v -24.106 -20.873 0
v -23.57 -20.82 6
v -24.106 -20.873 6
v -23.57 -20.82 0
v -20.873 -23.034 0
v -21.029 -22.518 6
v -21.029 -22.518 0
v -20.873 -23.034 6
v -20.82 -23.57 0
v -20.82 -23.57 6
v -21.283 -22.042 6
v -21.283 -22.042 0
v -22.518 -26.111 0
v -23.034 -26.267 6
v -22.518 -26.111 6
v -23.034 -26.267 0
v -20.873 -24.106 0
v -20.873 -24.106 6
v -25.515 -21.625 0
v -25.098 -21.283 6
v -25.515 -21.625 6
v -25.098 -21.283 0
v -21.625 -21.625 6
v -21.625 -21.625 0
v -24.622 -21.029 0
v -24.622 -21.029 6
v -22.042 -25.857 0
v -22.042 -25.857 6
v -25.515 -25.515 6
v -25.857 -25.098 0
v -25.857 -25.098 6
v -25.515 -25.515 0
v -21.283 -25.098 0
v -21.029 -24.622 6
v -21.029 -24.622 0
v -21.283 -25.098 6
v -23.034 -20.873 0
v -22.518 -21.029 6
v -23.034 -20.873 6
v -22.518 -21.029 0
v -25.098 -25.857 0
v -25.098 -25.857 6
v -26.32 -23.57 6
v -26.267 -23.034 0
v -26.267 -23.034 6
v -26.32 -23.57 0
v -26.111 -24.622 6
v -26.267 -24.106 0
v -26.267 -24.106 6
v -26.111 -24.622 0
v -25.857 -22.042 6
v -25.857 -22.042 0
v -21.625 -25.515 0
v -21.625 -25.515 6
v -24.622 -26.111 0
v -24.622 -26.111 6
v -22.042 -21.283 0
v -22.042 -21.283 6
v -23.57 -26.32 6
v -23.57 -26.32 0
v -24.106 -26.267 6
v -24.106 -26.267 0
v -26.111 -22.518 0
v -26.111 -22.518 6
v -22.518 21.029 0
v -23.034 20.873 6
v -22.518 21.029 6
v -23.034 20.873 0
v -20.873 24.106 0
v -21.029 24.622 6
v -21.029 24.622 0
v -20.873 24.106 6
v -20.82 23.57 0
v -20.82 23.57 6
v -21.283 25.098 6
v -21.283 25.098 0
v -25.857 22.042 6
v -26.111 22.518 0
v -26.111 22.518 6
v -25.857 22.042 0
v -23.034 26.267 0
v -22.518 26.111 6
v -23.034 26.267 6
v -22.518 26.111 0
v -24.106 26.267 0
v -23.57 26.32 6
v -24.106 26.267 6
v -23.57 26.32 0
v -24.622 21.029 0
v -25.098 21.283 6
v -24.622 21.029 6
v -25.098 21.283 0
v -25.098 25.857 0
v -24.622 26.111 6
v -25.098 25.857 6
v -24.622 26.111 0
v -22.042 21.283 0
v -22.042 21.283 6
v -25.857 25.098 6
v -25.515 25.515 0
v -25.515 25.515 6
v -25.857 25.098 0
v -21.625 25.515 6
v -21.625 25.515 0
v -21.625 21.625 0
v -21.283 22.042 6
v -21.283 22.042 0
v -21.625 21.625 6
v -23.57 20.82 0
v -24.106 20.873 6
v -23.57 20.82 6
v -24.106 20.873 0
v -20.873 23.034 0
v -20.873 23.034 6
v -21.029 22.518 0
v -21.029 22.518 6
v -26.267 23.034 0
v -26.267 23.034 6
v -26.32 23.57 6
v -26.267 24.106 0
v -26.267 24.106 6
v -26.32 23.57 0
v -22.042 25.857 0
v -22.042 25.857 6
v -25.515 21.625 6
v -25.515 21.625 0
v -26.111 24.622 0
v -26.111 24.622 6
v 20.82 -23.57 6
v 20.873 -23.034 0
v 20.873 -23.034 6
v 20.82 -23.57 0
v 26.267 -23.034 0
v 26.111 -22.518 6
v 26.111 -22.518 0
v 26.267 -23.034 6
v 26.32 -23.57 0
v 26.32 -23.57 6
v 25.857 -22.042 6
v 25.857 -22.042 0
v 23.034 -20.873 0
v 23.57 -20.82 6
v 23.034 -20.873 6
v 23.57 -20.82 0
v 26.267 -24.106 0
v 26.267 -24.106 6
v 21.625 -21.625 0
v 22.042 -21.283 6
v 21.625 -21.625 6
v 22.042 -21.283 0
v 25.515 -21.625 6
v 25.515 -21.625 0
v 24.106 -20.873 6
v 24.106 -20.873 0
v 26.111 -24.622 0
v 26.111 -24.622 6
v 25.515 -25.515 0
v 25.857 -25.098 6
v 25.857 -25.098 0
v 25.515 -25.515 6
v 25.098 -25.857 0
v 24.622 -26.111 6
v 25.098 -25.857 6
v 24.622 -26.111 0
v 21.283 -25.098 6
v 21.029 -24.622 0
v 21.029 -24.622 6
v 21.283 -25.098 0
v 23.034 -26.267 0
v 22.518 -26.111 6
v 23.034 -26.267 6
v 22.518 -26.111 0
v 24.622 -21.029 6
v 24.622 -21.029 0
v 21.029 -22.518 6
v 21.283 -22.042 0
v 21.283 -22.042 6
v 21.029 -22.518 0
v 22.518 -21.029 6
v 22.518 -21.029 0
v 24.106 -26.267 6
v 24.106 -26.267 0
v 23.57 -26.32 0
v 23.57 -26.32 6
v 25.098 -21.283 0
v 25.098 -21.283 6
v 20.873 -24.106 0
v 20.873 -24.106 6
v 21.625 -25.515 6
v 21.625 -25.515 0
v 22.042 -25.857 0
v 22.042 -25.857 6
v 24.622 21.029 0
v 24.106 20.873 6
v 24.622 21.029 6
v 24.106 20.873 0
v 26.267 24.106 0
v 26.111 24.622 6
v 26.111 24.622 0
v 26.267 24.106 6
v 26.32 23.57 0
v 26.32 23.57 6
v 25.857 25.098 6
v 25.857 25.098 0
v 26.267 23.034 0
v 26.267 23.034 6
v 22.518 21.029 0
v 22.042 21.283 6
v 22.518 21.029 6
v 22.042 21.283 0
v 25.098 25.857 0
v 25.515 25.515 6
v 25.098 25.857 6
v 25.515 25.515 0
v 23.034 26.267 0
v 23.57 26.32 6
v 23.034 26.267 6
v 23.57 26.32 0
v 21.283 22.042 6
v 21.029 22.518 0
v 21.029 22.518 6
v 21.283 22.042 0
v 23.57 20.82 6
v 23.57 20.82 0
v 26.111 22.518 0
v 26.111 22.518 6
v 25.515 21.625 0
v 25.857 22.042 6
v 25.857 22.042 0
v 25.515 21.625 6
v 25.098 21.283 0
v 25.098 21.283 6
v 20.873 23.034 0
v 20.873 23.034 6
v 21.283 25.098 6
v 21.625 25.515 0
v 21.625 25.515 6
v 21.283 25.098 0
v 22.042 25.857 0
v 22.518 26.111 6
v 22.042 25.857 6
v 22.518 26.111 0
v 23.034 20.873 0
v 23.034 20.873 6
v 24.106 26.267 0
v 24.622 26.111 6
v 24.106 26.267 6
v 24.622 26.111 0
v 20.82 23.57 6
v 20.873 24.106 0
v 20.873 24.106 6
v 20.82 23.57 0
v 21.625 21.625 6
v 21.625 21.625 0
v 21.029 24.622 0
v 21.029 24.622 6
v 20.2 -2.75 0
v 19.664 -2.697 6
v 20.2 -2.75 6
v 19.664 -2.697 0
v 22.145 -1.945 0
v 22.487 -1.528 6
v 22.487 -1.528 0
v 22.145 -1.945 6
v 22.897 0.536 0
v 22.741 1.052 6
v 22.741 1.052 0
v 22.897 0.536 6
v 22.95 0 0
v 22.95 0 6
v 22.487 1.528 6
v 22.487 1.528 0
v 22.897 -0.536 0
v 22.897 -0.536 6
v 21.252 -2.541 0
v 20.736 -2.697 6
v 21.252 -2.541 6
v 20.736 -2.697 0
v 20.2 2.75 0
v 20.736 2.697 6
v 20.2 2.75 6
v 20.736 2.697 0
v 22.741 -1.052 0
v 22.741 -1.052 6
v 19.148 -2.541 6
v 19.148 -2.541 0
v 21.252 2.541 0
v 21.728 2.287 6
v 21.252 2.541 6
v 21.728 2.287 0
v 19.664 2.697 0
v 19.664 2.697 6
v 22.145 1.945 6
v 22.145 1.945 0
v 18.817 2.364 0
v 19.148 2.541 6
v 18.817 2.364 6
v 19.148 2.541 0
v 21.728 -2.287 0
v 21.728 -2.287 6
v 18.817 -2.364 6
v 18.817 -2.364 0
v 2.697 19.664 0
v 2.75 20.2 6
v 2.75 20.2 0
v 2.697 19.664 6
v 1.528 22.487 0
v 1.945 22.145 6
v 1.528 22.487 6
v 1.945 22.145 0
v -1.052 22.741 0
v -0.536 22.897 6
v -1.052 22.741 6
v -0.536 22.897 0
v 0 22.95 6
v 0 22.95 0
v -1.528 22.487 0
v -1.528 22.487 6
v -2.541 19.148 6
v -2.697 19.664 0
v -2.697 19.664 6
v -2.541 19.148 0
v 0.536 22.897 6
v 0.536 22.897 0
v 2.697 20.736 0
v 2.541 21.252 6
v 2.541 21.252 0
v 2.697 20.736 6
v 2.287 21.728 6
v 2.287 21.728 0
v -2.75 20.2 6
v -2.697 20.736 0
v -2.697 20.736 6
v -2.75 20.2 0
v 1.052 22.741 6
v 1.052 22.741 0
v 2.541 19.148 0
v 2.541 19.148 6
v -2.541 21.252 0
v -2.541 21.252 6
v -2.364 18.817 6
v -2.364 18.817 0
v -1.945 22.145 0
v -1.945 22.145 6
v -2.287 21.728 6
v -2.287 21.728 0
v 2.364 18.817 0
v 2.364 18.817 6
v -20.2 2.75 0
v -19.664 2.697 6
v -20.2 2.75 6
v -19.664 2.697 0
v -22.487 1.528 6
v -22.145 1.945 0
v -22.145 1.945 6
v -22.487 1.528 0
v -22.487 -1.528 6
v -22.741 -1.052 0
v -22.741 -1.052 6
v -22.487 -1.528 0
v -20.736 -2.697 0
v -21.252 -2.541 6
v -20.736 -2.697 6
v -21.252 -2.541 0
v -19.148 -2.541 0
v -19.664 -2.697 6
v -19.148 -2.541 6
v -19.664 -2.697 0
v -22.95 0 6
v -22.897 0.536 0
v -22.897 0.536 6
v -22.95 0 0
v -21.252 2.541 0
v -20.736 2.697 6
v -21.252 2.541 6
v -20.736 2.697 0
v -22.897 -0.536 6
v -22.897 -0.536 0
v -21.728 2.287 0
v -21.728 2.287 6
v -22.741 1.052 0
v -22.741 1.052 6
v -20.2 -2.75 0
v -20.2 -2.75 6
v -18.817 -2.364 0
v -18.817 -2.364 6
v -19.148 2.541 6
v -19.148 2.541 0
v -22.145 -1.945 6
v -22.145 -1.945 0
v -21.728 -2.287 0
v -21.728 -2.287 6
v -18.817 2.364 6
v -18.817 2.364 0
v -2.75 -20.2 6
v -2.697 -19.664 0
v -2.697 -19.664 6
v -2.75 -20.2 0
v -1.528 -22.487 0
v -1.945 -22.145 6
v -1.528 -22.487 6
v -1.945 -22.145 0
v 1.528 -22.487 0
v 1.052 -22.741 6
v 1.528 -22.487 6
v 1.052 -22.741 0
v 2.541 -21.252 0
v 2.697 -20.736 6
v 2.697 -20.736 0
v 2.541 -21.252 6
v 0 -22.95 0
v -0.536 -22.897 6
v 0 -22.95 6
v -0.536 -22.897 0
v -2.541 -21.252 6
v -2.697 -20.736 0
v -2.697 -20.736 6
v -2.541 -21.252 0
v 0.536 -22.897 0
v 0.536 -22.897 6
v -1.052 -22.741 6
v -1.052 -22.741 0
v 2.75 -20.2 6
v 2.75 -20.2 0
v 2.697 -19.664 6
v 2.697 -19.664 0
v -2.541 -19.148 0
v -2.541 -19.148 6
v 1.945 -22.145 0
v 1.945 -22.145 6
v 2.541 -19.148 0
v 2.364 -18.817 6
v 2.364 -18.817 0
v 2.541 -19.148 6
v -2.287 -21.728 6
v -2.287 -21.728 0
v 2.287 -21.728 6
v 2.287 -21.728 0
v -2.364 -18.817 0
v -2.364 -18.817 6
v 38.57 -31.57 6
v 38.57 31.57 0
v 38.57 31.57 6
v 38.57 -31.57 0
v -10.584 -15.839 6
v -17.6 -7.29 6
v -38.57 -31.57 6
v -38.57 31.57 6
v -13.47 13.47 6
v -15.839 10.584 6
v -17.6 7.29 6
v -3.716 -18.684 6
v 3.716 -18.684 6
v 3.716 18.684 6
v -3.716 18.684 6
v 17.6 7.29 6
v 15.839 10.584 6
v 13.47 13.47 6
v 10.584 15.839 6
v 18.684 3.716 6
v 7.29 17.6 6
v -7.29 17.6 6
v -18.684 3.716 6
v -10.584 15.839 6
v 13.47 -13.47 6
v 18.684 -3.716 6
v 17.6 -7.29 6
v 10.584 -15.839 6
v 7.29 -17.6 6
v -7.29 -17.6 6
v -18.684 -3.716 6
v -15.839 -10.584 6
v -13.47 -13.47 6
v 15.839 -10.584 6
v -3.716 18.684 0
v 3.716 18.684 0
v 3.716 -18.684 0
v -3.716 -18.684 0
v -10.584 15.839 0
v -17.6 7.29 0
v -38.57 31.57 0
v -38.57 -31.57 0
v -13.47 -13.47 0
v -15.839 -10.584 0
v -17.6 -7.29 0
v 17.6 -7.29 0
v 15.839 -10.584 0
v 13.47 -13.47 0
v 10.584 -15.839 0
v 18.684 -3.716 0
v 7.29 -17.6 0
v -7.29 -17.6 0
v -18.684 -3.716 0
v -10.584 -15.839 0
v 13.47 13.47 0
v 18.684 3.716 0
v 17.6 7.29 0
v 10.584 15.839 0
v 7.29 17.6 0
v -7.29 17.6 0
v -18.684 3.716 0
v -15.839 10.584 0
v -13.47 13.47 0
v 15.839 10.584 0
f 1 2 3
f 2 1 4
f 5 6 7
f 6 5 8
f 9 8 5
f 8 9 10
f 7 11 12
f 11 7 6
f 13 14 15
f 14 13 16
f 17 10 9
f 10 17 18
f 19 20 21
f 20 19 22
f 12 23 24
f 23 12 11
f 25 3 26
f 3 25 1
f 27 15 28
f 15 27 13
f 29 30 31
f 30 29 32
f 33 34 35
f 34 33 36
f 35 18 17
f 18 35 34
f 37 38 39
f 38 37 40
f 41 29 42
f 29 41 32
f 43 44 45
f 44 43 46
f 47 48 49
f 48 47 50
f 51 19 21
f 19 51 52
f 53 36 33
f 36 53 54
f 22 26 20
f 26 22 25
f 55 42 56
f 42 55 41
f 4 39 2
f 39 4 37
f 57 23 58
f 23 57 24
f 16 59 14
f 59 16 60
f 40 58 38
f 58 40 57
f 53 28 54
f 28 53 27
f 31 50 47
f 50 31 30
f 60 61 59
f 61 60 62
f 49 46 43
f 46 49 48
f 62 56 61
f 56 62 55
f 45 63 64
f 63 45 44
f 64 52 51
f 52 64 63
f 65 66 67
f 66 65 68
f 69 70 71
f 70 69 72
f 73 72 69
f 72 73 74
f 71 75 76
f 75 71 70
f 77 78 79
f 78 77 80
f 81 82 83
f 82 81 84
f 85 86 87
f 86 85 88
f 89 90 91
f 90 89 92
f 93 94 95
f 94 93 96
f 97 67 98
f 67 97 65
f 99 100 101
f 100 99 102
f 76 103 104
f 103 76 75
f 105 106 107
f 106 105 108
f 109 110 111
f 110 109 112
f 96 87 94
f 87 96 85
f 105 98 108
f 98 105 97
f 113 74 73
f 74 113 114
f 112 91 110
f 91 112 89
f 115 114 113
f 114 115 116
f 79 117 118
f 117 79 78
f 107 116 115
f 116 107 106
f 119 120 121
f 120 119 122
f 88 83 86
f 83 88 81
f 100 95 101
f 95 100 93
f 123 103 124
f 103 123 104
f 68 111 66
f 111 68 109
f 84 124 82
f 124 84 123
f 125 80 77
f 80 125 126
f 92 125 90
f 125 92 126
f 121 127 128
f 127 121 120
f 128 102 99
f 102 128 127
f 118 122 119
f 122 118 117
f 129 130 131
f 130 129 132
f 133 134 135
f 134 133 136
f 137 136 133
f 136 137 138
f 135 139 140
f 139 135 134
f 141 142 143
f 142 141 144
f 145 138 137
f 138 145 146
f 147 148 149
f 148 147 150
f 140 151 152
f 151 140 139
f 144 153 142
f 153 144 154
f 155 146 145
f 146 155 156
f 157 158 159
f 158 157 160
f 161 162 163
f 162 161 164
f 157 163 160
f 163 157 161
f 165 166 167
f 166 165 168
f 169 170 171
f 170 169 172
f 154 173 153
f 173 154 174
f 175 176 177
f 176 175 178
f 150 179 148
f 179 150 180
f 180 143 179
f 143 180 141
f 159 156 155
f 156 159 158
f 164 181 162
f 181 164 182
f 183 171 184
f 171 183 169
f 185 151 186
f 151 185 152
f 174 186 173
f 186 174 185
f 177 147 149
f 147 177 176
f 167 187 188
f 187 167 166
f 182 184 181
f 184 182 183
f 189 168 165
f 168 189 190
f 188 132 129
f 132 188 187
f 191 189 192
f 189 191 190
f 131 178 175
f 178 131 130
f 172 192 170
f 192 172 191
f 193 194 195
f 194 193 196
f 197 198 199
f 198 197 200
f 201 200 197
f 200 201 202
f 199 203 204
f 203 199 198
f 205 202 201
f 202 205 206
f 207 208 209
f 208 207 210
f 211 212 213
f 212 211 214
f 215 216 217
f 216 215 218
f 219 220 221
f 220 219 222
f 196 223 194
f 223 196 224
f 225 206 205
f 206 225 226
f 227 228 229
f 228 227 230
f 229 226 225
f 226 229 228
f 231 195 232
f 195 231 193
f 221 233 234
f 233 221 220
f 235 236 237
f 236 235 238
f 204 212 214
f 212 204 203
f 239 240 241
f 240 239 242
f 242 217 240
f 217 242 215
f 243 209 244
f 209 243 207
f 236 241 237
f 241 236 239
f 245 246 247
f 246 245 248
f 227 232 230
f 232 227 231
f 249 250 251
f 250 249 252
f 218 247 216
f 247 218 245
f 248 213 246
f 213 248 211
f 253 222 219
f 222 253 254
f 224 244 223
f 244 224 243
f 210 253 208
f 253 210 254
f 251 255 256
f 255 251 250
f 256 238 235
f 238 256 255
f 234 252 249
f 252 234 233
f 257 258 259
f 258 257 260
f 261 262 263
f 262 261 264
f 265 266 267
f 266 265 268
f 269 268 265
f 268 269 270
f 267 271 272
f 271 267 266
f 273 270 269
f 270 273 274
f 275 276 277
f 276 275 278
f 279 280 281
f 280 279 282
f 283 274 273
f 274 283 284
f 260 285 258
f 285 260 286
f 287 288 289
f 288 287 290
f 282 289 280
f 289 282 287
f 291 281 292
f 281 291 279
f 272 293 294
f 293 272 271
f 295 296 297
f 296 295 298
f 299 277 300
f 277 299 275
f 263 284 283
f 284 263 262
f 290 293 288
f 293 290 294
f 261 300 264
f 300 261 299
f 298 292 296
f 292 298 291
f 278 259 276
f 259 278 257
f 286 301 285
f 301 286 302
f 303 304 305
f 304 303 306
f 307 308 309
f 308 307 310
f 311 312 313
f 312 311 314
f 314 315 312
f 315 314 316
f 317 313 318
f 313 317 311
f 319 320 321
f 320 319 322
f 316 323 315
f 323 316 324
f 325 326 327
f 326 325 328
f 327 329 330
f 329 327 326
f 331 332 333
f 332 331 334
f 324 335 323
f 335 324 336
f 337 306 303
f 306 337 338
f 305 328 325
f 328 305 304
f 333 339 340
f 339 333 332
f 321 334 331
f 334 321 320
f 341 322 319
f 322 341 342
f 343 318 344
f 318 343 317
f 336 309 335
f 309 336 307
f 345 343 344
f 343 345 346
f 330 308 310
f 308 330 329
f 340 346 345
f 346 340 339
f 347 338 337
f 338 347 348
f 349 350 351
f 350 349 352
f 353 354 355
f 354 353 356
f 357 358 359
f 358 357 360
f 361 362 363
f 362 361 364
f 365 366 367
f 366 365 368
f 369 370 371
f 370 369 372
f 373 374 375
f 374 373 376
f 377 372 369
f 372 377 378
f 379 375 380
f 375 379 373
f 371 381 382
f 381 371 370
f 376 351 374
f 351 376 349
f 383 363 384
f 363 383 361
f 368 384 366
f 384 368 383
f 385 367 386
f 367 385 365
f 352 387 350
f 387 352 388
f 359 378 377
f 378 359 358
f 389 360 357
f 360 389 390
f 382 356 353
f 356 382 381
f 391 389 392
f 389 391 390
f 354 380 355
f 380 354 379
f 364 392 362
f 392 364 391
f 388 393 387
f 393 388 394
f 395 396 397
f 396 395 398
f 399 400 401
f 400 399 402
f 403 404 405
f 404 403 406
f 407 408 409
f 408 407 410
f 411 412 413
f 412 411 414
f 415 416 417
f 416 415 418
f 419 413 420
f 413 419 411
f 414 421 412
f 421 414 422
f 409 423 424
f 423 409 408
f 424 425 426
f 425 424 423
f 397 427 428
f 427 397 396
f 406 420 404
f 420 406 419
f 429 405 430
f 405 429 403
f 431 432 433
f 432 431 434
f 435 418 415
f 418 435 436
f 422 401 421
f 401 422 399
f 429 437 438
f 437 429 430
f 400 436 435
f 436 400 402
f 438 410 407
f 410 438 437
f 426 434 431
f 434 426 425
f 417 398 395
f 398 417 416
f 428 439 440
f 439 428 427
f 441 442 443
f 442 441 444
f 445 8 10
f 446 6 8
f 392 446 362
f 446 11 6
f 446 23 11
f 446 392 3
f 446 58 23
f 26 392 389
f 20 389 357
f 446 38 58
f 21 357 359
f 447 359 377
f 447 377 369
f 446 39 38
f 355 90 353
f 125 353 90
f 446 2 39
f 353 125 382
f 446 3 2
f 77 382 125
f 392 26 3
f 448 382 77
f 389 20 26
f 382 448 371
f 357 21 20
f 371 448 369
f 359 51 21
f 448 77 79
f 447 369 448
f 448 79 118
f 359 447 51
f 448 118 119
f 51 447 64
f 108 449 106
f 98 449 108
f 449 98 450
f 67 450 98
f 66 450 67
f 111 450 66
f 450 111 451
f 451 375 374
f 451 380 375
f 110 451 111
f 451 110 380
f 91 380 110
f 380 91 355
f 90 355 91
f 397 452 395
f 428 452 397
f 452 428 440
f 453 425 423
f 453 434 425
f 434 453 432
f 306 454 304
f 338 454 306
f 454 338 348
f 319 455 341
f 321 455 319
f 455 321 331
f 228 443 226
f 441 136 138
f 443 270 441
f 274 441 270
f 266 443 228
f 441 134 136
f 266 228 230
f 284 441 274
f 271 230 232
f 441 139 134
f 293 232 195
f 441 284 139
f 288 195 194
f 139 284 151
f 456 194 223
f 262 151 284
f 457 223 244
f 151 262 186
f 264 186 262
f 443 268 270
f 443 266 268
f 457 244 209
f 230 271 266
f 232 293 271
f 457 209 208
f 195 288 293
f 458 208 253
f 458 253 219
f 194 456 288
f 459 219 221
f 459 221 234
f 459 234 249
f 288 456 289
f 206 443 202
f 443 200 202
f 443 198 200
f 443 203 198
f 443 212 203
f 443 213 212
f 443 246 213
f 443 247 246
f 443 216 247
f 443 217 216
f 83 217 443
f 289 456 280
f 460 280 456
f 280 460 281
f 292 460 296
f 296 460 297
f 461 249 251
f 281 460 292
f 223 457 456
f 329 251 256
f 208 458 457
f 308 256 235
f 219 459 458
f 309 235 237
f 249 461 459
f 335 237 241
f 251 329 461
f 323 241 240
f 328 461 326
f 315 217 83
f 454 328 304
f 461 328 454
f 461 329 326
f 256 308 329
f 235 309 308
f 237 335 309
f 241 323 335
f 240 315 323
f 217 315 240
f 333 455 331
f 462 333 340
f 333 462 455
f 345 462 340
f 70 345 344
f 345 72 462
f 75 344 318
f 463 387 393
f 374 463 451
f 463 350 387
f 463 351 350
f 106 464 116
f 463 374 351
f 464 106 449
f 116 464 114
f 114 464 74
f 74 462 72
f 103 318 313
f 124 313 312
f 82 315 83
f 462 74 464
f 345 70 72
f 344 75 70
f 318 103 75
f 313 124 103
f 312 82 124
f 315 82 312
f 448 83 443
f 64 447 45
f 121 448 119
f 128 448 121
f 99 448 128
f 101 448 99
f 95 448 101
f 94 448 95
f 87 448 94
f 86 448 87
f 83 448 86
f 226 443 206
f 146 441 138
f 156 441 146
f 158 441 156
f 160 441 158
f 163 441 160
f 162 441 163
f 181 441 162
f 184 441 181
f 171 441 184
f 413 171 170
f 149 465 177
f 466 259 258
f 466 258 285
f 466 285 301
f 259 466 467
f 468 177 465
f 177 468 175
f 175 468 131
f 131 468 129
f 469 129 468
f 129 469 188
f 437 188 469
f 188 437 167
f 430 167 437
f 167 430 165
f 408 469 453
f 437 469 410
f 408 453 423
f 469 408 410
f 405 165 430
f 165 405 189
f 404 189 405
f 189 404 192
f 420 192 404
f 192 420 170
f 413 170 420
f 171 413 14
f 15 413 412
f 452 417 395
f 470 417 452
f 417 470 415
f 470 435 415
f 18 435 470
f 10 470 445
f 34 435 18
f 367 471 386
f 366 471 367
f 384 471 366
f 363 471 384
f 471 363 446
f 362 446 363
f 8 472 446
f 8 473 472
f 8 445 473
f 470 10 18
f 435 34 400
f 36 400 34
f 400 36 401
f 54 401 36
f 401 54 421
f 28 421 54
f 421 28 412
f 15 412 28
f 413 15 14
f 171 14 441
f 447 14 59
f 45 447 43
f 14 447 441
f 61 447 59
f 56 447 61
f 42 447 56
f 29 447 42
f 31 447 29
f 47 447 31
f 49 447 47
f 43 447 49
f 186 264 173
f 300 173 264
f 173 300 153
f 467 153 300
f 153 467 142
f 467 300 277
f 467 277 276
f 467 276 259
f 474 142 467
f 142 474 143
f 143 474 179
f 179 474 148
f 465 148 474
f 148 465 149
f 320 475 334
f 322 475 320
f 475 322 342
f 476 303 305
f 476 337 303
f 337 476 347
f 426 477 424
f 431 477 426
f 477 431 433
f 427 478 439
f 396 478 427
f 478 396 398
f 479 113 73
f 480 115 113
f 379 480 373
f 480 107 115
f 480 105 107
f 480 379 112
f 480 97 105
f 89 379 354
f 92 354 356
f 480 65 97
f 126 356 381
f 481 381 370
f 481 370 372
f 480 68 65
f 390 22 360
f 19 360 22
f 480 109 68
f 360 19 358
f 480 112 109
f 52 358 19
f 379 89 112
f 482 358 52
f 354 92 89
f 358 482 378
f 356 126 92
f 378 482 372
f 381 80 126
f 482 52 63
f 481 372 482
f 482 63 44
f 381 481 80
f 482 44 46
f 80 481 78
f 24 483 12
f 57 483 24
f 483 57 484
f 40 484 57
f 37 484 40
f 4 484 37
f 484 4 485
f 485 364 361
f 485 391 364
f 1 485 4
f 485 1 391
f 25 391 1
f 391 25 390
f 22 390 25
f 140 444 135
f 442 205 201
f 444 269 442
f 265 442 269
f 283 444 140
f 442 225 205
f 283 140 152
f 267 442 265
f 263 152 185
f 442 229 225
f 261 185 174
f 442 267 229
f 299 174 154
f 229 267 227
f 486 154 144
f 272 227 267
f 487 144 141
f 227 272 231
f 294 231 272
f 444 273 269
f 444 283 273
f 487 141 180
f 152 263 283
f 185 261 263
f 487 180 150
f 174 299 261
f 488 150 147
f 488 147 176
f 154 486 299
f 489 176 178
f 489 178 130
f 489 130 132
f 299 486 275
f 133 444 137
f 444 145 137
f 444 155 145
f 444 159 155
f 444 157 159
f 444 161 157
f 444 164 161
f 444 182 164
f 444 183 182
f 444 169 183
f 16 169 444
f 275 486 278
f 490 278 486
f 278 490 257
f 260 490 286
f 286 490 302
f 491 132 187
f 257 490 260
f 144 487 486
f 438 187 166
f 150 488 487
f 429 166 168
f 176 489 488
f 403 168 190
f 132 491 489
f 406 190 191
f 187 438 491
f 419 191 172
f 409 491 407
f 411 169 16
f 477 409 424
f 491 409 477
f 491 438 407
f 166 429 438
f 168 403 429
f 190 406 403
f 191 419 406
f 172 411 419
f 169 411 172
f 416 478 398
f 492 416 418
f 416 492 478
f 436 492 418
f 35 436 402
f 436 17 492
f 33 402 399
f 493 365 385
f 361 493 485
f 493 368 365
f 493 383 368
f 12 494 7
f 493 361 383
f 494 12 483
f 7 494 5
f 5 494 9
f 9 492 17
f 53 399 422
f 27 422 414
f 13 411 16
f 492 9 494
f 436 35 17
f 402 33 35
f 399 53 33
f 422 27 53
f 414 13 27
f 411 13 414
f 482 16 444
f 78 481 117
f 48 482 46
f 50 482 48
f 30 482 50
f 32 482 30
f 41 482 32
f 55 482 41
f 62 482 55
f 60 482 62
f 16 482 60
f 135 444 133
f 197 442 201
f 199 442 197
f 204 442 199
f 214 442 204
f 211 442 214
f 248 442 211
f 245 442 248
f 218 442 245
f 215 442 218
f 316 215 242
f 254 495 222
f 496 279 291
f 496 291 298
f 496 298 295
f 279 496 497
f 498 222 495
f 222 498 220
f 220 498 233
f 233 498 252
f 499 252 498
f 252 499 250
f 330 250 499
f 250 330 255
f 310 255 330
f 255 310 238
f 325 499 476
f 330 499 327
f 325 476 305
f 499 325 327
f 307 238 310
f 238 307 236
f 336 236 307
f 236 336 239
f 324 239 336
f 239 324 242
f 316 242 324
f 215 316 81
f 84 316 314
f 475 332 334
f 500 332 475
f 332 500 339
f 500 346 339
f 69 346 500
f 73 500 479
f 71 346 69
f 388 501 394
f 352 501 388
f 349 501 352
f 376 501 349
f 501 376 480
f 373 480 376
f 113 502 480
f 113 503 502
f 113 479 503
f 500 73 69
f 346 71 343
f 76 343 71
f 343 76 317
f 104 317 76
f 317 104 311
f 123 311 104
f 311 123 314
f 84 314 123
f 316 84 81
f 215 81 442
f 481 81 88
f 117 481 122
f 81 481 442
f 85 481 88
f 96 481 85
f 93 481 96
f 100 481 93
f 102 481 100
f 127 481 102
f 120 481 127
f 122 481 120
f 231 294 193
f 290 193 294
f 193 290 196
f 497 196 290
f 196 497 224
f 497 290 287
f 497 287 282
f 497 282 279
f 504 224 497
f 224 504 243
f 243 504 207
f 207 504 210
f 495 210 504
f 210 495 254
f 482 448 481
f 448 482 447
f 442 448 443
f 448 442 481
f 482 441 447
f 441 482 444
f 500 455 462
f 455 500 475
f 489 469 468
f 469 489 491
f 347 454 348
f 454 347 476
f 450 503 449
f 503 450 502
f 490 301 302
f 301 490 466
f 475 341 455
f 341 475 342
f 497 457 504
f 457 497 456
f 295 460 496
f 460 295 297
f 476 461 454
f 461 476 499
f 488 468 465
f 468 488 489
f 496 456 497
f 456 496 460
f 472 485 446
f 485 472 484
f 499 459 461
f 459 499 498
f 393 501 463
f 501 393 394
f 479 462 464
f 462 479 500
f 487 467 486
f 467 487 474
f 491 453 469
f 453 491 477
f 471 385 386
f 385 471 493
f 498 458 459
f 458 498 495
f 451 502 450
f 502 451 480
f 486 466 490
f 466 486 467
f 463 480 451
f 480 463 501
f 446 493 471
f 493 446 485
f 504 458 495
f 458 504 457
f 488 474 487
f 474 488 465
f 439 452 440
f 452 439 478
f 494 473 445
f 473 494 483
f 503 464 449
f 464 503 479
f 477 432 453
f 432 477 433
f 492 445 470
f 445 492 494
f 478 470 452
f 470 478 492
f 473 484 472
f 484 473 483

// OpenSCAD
$fn = 32;

// ----------------------------------------------------------------------
// Motor mount plate: NEMA23, 77.14 x 63.14 x 6 mm
// ----------------------------------------------------------------------

// --- parameters (mm) ---
base_x = 77.14;           // plate length, X
base_y = 63.14;           // plate width, Y
thick = 6;                // plate thickness
bolt_pitch = 47.14;       // NEMA23 bolt spacing
motor_d = 5.5;            // NEMA23 screw clearance
boss_hole = 38.1;         // pilot boss bore
second_d = 5.5;           // second fastener hole
bc_r = 20.2;              // second bolt circle radius
bc_n = 4;                 // second bolt circle count

module plate() {
  translate([-base_x / 2, -base_y / 2, 0]) cube([base_x, base_y, thick]);
}

module motor_holes() {
  for (sx = [-1, 1]) for (sy = [-1, 1])
    translate([sx * bolt_pitch / 2, sy * bolt_pitch / 2, -1])
      cylinder(h = thick + 2, d = motor_d);
}

difference() {
  union() {
    plate();
  }
  motor_holes();
  translate([0, 0, -1]) cylinder(h = thick + 2, d = boss_hole);
  for (i = [0 : bc_n - 1]) rotate([0, 0, i * 360 / bc_n]) translate([bc_r, 0, -1])    cylinder(h = thick + 2, d = second_d);
}
